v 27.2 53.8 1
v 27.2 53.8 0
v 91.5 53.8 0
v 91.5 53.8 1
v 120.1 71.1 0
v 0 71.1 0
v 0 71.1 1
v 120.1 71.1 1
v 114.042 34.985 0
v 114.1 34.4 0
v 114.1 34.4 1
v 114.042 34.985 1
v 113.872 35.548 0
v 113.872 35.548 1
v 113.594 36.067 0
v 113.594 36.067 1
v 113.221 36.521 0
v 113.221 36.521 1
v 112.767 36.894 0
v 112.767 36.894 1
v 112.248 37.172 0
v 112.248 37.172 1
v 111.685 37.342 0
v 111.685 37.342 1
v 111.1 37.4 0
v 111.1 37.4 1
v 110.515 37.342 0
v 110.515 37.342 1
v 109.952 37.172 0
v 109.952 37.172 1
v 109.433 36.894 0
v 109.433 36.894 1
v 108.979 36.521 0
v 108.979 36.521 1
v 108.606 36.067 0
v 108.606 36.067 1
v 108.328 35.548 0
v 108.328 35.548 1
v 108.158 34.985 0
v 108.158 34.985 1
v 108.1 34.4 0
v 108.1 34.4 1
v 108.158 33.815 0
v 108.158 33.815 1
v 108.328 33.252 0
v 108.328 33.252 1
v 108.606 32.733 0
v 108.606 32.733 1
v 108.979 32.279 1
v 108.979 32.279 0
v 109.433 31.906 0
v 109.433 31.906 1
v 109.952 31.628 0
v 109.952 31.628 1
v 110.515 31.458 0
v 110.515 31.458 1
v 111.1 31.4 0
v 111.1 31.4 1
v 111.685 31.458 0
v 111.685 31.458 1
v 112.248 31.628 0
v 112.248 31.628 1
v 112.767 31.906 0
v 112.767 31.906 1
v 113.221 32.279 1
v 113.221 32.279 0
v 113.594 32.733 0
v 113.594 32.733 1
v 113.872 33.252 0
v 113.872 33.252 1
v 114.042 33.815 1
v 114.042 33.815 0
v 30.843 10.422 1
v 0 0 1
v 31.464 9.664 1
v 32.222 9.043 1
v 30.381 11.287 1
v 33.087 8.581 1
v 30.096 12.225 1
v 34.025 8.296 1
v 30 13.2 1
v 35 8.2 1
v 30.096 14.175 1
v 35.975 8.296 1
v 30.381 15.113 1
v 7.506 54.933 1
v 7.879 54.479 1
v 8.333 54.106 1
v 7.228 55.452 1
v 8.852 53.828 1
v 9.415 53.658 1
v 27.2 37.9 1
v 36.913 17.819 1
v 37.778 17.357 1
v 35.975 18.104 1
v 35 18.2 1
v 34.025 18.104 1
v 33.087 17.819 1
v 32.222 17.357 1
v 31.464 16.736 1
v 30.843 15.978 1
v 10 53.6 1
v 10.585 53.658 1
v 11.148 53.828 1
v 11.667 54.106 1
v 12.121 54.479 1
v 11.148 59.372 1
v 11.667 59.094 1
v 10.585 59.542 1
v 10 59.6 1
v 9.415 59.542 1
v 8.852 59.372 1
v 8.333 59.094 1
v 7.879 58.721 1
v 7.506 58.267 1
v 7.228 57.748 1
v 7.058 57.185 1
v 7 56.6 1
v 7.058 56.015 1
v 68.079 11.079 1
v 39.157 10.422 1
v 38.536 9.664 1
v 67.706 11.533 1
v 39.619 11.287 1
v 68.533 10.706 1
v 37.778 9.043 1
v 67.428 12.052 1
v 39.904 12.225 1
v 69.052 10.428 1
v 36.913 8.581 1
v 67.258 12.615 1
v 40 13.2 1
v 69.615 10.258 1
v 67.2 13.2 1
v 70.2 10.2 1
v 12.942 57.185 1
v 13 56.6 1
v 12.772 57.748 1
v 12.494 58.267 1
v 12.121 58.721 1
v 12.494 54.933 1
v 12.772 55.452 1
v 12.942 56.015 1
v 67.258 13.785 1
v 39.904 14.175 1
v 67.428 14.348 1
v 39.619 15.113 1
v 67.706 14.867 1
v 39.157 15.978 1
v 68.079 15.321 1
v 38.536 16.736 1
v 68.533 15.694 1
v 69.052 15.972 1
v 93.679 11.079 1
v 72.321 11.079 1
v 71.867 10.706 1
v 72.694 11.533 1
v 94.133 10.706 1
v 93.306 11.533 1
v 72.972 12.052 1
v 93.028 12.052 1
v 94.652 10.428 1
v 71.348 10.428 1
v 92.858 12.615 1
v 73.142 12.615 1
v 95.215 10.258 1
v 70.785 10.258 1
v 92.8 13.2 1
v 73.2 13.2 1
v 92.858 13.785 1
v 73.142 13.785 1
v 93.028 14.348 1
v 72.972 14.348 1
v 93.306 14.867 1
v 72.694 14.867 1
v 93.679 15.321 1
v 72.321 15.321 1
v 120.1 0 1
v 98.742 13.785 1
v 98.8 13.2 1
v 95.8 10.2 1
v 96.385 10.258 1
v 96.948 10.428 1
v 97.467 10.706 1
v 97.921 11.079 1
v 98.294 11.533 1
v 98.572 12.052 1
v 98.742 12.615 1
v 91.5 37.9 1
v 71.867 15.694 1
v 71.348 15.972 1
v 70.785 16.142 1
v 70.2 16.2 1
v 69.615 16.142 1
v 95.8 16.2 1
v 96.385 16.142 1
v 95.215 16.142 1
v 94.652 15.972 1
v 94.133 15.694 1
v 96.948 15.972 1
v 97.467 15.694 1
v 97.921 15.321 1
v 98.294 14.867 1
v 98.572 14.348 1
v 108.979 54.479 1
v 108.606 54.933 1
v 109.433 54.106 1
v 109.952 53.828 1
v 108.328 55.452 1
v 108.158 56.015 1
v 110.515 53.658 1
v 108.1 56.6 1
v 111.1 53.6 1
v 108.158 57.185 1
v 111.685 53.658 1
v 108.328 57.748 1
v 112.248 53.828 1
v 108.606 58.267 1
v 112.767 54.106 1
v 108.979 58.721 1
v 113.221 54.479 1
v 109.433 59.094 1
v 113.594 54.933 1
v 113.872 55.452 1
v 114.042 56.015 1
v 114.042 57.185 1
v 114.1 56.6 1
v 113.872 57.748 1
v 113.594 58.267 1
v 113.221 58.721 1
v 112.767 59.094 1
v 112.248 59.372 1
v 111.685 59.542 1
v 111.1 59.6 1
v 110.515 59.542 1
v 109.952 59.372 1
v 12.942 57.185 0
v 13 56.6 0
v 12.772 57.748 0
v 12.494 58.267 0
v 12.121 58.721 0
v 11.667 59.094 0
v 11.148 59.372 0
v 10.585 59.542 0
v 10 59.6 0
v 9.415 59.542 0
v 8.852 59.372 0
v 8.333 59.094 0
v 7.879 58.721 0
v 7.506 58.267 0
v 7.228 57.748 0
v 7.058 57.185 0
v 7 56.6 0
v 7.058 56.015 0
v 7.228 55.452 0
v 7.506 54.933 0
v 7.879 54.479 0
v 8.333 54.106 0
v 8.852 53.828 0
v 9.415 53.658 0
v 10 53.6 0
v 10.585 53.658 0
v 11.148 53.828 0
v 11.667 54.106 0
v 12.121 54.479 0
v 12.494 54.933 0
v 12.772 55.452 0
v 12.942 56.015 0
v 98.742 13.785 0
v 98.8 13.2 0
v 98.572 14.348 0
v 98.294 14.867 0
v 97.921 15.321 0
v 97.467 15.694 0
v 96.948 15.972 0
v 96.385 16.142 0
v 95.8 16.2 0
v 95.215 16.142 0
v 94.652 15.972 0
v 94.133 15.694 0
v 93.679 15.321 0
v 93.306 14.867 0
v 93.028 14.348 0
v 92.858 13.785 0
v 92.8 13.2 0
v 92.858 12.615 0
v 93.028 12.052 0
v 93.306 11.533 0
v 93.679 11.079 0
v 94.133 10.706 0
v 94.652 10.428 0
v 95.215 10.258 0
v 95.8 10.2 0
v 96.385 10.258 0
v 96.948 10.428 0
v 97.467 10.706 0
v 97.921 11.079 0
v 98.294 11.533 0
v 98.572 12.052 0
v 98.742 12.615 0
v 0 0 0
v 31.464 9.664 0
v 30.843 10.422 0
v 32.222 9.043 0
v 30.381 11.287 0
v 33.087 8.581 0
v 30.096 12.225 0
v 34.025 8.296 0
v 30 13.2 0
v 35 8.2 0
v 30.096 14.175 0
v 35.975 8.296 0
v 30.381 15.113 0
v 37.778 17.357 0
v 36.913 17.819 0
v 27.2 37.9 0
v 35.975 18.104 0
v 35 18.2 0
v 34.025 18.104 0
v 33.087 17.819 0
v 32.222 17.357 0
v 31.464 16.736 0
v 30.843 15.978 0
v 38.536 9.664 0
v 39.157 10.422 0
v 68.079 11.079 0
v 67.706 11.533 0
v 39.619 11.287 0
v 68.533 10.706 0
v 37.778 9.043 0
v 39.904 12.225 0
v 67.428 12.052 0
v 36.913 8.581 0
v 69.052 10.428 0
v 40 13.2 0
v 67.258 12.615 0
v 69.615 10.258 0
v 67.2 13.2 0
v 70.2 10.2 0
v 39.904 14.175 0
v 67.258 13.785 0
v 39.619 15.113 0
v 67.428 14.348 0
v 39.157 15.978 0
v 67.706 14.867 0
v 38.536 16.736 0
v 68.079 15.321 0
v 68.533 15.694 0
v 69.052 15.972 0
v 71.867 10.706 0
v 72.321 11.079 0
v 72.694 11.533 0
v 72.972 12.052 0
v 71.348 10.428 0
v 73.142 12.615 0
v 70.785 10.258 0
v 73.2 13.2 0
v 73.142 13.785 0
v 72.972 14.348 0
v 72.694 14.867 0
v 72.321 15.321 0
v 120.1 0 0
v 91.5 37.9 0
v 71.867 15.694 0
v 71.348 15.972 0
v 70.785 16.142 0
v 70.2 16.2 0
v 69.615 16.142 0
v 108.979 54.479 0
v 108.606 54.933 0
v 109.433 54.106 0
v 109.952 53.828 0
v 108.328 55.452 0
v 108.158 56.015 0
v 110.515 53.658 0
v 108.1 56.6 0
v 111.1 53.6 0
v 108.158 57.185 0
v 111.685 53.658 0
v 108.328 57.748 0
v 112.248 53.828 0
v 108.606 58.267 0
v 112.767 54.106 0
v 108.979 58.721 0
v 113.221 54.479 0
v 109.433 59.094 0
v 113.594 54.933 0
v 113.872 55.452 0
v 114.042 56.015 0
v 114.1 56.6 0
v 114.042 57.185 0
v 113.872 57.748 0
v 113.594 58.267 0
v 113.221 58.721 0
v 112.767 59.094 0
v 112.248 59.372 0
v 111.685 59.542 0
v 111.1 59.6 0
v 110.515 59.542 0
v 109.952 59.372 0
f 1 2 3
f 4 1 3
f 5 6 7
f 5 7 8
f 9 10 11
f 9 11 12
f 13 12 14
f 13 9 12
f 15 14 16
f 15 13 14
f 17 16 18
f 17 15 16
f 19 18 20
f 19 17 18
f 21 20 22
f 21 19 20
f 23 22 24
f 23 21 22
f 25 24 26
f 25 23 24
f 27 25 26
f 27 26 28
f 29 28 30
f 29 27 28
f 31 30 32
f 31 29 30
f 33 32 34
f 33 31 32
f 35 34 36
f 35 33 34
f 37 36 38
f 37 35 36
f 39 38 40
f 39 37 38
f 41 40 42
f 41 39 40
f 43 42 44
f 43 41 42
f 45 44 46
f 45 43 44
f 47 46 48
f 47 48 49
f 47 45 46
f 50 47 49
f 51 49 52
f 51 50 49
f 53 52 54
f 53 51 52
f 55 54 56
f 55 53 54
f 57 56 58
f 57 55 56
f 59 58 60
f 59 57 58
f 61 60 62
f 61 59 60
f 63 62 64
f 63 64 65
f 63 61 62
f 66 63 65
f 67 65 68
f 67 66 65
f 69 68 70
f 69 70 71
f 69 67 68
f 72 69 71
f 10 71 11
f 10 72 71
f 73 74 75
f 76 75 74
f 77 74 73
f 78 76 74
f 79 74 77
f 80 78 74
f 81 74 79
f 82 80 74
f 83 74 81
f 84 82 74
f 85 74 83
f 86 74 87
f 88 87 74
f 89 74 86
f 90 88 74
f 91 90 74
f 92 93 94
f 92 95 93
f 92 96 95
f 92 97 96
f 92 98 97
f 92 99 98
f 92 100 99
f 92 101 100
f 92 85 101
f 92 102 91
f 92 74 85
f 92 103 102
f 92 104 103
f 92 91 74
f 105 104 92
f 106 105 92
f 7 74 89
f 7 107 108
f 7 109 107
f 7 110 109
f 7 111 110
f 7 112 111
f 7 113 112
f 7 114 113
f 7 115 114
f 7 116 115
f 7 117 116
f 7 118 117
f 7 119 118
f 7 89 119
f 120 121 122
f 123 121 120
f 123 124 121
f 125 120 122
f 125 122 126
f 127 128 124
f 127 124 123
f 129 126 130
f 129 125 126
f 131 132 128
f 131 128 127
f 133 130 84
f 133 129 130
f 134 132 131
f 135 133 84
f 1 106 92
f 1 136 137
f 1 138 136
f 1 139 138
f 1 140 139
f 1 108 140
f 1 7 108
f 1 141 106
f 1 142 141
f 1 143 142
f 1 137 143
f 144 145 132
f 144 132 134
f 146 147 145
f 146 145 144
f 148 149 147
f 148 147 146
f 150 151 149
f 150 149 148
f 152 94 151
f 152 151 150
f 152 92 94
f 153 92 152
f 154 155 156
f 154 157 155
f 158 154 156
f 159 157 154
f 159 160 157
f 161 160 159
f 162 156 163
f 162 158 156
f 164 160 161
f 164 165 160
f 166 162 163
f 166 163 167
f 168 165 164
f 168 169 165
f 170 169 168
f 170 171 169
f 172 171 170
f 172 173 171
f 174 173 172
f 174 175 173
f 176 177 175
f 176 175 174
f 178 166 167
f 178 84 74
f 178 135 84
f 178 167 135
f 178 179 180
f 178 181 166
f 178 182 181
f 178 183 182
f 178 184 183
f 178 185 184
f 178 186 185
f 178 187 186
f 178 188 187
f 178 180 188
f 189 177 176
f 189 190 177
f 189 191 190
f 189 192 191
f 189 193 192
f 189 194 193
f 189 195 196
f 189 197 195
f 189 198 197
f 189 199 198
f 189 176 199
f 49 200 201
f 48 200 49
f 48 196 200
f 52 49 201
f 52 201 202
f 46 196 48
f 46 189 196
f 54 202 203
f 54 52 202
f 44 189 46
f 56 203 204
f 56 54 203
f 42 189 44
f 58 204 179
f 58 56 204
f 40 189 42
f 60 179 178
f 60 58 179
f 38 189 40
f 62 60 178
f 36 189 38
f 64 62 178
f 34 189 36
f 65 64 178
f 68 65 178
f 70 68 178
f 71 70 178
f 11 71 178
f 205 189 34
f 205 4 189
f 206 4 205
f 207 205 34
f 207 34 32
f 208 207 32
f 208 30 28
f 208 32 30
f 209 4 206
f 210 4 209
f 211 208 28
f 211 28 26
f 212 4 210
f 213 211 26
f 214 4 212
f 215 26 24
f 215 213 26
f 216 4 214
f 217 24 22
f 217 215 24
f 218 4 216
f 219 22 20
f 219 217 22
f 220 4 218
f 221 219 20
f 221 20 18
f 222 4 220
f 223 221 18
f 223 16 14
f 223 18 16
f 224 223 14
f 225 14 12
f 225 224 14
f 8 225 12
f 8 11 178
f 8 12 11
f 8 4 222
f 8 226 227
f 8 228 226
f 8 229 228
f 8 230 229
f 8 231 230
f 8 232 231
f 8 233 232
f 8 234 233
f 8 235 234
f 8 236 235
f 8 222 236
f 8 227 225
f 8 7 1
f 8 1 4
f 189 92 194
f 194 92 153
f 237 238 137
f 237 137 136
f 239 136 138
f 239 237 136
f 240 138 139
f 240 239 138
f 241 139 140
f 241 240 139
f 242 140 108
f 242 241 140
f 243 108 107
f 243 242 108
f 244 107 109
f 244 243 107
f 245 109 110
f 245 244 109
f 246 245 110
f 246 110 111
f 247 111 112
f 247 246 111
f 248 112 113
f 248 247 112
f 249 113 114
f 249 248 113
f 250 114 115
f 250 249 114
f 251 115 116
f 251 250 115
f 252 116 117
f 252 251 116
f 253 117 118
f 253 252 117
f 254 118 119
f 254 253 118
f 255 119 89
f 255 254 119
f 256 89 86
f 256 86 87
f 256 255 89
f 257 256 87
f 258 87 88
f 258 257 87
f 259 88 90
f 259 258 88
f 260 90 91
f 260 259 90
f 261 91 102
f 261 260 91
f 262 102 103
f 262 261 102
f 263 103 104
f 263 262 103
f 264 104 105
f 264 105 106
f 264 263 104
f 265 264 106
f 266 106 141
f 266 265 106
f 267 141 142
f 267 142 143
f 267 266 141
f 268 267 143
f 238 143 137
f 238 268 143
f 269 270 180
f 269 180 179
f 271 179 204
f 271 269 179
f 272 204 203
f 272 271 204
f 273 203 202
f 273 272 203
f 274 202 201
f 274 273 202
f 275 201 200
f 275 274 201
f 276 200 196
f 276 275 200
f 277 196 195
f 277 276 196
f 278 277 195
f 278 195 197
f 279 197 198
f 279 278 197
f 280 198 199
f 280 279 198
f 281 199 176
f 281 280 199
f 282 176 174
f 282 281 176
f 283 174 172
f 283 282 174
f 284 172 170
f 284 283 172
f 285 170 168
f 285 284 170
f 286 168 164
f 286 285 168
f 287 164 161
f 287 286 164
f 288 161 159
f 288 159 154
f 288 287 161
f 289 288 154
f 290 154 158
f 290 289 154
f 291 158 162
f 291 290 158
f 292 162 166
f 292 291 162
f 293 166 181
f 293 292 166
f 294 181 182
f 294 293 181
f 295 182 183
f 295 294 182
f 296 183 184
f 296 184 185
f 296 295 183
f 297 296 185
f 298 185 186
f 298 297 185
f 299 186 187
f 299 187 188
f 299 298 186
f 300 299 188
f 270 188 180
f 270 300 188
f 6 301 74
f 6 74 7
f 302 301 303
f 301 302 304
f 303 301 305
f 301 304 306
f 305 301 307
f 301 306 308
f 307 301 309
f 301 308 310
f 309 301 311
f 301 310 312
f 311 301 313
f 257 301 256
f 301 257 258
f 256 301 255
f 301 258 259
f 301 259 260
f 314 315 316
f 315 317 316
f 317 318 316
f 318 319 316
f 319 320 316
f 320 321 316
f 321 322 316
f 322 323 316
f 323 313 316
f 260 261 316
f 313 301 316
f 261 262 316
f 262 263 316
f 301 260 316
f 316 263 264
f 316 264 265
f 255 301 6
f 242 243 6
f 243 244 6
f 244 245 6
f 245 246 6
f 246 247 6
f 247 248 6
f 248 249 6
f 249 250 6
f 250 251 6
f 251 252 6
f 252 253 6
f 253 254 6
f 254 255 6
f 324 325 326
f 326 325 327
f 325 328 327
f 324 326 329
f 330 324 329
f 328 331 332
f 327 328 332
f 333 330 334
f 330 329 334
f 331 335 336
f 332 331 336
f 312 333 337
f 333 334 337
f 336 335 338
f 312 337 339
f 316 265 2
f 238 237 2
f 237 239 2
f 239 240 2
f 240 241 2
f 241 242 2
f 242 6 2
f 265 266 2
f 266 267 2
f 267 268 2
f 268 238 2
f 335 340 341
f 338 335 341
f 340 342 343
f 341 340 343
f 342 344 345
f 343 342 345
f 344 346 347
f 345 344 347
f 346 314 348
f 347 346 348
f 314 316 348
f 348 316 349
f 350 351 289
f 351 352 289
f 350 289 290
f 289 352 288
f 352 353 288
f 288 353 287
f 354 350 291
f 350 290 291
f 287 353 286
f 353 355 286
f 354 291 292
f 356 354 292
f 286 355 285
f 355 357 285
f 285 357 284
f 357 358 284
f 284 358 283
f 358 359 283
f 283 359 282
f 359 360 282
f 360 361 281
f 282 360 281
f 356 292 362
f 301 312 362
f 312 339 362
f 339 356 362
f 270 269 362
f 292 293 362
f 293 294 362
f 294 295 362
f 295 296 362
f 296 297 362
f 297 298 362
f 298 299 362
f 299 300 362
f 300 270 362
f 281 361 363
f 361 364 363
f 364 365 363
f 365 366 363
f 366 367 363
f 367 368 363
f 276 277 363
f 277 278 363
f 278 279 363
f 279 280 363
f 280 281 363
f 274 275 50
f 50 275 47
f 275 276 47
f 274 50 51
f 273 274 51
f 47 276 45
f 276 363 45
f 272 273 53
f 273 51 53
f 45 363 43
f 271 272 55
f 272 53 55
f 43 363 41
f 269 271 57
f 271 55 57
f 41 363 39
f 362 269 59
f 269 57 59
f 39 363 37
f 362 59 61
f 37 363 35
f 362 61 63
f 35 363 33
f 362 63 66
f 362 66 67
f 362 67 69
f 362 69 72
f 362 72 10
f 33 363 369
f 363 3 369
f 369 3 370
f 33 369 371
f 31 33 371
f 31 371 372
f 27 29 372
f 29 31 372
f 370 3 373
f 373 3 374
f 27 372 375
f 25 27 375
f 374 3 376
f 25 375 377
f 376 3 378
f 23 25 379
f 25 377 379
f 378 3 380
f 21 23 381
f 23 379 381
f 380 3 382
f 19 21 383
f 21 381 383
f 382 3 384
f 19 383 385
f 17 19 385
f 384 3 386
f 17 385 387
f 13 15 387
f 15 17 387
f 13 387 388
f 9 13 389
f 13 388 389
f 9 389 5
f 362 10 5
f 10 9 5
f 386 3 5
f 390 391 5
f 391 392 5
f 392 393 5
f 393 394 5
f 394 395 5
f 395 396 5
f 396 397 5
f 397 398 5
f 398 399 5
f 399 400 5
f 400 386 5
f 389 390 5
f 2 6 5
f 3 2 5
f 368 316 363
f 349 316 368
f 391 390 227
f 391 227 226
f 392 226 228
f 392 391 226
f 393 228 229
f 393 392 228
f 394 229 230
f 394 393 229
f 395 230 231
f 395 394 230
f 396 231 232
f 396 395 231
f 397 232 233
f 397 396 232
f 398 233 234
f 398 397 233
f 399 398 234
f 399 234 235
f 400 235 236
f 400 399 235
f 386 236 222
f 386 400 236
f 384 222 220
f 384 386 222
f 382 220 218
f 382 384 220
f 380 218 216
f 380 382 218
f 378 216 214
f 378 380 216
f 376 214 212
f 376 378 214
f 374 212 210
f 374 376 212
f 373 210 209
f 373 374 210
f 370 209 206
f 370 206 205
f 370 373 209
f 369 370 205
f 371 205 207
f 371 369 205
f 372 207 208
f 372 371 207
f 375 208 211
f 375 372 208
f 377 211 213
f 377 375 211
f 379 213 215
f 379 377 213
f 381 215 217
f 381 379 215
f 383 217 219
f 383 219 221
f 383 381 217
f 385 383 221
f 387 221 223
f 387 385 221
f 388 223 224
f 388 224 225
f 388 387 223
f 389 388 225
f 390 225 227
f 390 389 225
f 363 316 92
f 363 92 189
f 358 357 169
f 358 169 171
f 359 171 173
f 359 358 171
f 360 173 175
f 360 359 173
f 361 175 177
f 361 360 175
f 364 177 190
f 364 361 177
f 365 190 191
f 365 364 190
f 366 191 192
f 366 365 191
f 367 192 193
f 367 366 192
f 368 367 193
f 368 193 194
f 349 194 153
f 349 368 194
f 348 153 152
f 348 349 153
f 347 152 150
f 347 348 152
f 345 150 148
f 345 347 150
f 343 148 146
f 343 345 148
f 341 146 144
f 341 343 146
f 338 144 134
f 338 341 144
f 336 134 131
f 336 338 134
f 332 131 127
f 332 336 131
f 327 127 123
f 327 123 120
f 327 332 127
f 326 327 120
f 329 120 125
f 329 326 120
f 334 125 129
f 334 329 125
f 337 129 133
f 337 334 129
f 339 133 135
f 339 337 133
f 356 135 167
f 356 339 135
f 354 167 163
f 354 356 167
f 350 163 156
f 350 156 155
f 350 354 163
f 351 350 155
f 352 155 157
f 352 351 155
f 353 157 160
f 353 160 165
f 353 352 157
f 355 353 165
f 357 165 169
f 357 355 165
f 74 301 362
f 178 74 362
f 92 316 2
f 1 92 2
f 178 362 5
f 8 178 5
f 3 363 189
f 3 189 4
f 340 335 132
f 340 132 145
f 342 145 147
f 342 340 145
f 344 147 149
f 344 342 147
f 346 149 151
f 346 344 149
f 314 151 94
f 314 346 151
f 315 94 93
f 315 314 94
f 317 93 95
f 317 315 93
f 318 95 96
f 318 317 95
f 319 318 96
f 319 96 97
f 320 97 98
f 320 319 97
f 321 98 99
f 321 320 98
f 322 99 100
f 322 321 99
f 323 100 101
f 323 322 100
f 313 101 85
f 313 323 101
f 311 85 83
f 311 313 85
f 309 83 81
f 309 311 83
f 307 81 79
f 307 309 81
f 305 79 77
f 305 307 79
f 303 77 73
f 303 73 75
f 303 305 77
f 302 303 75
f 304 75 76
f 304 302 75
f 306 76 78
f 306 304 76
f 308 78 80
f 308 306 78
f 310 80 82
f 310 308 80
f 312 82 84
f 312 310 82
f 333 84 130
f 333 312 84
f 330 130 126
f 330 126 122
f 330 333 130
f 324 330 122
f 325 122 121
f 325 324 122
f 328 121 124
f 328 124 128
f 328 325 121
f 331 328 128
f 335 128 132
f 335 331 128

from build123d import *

# Parameters (mm, degrees)
F0_W     = 120.1
F0_H     = 71.1
F0_R     = 5
F0_R_2   = 3
F0_W_2   = 64.3
F0_H_2   = 15.9
F1_DEPTH = 1


with BuildPart() as f1:
    # F0 (on Top) → F1 (new body)
    with BuildSketch(Plane.XY):
        with Locations((60.05, 35.55)):
            Rectangle(F0_W, F0_H)
        with Locations((35, 13.2)):
            Circle(F0_R, mode=Mode.SUBTRACT)
        with Locations((70.2, 13.2)):
            Circle(F0_R_2, mode=Mode.SUBTRACT)
        with Locations((95.8, 13.2)):
            Circle(F0_R_2, mode=Mode.SUBTRACT)
        with Locations((111.1, 34.4)):
            Circle(F0_R_2, mode=Mode.SUBTRACT)
        with Locations((59.35, 45.85)):
            Rectangle(F0_W_2, F0_H_2, mode=Mode.SUBTRACT)
        with Locations((10, 56.6)):
            Circle(F0_R_2, mode=Mode.SUBTRACT)
        with Locations((111.1, 56.6)):
            Circle(F0_R_2, mode=Mode.SUBTRACT)
    extrude(amount=F1_DEPTH)


solid = f1.part
